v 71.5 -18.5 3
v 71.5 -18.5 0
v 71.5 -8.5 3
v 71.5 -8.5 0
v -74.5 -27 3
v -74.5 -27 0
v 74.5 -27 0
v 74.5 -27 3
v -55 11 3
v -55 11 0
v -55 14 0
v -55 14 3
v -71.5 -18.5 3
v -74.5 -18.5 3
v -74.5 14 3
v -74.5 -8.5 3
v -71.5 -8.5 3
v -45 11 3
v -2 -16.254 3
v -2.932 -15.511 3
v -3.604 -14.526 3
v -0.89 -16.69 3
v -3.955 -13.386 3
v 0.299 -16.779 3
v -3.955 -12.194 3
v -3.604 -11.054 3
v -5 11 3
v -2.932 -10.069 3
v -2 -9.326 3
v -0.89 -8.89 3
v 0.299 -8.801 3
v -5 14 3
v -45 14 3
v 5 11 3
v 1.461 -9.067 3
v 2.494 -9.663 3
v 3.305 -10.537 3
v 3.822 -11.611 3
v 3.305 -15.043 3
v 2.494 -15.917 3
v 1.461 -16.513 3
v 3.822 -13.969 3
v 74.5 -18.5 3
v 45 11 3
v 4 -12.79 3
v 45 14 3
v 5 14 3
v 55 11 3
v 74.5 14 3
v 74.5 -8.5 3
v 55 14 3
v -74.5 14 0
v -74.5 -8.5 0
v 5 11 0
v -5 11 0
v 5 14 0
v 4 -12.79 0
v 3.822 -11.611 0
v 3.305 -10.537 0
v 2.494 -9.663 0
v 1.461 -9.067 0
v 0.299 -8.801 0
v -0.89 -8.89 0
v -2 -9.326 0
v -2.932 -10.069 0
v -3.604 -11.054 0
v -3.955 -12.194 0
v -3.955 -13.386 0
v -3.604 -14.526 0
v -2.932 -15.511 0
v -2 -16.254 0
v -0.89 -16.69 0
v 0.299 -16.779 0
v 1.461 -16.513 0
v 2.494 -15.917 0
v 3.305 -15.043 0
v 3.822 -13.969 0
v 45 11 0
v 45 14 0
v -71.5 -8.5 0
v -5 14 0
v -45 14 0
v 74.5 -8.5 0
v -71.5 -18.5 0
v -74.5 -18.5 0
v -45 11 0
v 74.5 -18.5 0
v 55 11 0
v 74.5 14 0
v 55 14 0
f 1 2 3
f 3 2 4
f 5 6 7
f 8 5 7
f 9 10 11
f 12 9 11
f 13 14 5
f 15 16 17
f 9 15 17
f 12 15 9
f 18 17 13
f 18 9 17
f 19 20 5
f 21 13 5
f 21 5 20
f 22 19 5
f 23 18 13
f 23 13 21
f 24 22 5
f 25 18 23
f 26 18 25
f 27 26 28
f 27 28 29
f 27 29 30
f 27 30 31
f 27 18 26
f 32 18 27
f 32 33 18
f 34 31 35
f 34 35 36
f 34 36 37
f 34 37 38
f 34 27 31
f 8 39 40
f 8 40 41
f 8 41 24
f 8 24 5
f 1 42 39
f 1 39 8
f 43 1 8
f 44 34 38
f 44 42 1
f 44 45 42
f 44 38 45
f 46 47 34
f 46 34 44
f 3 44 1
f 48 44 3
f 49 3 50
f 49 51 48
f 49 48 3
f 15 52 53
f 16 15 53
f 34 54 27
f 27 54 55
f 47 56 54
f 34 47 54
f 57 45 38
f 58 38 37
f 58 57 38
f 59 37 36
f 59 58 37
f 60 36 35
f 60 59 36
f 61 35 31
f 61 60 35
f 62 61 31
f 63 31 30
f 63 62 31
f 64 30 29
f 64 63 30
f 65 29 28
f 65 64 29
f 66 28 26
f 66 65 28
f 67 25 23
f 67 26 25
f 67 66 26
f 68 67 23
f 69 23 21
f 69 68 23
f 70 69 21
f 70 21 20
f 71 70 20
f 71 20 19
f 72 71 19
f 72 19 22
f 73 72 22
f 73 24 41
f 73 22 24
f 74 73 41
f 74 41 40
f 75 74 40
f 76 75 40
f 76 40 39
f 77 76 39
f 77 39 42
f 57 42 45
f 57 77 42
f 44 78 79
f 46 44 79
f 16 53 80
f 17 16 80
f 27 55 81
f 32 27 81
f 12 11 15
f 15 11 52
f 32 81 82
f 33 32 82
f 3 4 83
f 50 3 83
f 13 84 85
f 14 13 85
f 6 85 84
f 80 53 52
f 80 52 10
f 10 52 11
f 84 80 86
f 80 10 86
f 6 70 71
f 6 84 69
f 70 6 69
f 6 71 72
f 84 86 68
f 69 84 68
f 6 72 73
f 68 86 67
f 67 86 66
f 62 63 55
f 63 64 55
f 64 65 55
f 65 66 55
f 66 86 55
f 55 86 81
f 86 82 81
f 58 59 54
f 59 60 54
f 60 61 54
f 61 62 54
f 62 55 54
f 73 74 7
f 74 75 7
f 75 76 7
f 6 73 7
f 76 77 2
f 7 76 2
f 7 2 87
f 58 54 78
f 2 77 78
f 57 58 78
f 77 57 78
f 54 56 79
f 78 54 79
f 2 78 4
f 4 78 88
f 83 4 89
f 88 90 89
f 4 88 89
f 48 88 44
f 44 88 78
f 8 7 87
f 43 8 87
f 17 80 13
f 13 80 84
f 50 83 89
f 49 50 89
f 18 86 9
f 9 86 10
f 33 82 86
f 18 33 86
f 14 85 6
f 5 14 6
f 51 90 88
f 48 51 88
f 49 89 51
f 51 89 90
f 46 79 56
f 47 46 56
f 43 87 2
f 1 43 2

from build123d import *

# Parameters (mm, degrees)
BOSS_EXTRUDE1_DEPTH = 3
SKETCH2_R           = 4
CUT_EXTRUDE1_DEPTH  = 80.298486745


with BuildPart() as part:
    # Sketch1 → Boss-Extrude1 (new body)
    with BuildSketch(Plane.XY):
        Polygon((-74.5, 14), (-74.5, -8.5), (-71.5, -8.5), (-71.5, -18.5), (-74.5, -18.5), (-74.5, -27), (74.5, -27), (74.5, -18.5), (71.5, -18.5), (71.5, -8.5), (74.5, -8.5), (74.5, 14), (55, 14), (55, 11), (45, 11), (45, 14), (5, 14), (5, 11), (-5, 11), (-5, 14), (-45, 14), (-45, 11), (-55, 11), (-55, 14), align=None)
    extrude(amount=BOSS_EXTRUDE1_DEPTH)

    # Sketch2 → Cut-Extrude1 (cut, through all)
    with BuildSketch(Plane.XY):
        with Locations((0, -12.79)):
            Circle(SKETCH2_R)
    extrude(amount=CUT_EXTRUDE1_DEPTH, mode=Mode.SUBTRACT)


solid = part.part
